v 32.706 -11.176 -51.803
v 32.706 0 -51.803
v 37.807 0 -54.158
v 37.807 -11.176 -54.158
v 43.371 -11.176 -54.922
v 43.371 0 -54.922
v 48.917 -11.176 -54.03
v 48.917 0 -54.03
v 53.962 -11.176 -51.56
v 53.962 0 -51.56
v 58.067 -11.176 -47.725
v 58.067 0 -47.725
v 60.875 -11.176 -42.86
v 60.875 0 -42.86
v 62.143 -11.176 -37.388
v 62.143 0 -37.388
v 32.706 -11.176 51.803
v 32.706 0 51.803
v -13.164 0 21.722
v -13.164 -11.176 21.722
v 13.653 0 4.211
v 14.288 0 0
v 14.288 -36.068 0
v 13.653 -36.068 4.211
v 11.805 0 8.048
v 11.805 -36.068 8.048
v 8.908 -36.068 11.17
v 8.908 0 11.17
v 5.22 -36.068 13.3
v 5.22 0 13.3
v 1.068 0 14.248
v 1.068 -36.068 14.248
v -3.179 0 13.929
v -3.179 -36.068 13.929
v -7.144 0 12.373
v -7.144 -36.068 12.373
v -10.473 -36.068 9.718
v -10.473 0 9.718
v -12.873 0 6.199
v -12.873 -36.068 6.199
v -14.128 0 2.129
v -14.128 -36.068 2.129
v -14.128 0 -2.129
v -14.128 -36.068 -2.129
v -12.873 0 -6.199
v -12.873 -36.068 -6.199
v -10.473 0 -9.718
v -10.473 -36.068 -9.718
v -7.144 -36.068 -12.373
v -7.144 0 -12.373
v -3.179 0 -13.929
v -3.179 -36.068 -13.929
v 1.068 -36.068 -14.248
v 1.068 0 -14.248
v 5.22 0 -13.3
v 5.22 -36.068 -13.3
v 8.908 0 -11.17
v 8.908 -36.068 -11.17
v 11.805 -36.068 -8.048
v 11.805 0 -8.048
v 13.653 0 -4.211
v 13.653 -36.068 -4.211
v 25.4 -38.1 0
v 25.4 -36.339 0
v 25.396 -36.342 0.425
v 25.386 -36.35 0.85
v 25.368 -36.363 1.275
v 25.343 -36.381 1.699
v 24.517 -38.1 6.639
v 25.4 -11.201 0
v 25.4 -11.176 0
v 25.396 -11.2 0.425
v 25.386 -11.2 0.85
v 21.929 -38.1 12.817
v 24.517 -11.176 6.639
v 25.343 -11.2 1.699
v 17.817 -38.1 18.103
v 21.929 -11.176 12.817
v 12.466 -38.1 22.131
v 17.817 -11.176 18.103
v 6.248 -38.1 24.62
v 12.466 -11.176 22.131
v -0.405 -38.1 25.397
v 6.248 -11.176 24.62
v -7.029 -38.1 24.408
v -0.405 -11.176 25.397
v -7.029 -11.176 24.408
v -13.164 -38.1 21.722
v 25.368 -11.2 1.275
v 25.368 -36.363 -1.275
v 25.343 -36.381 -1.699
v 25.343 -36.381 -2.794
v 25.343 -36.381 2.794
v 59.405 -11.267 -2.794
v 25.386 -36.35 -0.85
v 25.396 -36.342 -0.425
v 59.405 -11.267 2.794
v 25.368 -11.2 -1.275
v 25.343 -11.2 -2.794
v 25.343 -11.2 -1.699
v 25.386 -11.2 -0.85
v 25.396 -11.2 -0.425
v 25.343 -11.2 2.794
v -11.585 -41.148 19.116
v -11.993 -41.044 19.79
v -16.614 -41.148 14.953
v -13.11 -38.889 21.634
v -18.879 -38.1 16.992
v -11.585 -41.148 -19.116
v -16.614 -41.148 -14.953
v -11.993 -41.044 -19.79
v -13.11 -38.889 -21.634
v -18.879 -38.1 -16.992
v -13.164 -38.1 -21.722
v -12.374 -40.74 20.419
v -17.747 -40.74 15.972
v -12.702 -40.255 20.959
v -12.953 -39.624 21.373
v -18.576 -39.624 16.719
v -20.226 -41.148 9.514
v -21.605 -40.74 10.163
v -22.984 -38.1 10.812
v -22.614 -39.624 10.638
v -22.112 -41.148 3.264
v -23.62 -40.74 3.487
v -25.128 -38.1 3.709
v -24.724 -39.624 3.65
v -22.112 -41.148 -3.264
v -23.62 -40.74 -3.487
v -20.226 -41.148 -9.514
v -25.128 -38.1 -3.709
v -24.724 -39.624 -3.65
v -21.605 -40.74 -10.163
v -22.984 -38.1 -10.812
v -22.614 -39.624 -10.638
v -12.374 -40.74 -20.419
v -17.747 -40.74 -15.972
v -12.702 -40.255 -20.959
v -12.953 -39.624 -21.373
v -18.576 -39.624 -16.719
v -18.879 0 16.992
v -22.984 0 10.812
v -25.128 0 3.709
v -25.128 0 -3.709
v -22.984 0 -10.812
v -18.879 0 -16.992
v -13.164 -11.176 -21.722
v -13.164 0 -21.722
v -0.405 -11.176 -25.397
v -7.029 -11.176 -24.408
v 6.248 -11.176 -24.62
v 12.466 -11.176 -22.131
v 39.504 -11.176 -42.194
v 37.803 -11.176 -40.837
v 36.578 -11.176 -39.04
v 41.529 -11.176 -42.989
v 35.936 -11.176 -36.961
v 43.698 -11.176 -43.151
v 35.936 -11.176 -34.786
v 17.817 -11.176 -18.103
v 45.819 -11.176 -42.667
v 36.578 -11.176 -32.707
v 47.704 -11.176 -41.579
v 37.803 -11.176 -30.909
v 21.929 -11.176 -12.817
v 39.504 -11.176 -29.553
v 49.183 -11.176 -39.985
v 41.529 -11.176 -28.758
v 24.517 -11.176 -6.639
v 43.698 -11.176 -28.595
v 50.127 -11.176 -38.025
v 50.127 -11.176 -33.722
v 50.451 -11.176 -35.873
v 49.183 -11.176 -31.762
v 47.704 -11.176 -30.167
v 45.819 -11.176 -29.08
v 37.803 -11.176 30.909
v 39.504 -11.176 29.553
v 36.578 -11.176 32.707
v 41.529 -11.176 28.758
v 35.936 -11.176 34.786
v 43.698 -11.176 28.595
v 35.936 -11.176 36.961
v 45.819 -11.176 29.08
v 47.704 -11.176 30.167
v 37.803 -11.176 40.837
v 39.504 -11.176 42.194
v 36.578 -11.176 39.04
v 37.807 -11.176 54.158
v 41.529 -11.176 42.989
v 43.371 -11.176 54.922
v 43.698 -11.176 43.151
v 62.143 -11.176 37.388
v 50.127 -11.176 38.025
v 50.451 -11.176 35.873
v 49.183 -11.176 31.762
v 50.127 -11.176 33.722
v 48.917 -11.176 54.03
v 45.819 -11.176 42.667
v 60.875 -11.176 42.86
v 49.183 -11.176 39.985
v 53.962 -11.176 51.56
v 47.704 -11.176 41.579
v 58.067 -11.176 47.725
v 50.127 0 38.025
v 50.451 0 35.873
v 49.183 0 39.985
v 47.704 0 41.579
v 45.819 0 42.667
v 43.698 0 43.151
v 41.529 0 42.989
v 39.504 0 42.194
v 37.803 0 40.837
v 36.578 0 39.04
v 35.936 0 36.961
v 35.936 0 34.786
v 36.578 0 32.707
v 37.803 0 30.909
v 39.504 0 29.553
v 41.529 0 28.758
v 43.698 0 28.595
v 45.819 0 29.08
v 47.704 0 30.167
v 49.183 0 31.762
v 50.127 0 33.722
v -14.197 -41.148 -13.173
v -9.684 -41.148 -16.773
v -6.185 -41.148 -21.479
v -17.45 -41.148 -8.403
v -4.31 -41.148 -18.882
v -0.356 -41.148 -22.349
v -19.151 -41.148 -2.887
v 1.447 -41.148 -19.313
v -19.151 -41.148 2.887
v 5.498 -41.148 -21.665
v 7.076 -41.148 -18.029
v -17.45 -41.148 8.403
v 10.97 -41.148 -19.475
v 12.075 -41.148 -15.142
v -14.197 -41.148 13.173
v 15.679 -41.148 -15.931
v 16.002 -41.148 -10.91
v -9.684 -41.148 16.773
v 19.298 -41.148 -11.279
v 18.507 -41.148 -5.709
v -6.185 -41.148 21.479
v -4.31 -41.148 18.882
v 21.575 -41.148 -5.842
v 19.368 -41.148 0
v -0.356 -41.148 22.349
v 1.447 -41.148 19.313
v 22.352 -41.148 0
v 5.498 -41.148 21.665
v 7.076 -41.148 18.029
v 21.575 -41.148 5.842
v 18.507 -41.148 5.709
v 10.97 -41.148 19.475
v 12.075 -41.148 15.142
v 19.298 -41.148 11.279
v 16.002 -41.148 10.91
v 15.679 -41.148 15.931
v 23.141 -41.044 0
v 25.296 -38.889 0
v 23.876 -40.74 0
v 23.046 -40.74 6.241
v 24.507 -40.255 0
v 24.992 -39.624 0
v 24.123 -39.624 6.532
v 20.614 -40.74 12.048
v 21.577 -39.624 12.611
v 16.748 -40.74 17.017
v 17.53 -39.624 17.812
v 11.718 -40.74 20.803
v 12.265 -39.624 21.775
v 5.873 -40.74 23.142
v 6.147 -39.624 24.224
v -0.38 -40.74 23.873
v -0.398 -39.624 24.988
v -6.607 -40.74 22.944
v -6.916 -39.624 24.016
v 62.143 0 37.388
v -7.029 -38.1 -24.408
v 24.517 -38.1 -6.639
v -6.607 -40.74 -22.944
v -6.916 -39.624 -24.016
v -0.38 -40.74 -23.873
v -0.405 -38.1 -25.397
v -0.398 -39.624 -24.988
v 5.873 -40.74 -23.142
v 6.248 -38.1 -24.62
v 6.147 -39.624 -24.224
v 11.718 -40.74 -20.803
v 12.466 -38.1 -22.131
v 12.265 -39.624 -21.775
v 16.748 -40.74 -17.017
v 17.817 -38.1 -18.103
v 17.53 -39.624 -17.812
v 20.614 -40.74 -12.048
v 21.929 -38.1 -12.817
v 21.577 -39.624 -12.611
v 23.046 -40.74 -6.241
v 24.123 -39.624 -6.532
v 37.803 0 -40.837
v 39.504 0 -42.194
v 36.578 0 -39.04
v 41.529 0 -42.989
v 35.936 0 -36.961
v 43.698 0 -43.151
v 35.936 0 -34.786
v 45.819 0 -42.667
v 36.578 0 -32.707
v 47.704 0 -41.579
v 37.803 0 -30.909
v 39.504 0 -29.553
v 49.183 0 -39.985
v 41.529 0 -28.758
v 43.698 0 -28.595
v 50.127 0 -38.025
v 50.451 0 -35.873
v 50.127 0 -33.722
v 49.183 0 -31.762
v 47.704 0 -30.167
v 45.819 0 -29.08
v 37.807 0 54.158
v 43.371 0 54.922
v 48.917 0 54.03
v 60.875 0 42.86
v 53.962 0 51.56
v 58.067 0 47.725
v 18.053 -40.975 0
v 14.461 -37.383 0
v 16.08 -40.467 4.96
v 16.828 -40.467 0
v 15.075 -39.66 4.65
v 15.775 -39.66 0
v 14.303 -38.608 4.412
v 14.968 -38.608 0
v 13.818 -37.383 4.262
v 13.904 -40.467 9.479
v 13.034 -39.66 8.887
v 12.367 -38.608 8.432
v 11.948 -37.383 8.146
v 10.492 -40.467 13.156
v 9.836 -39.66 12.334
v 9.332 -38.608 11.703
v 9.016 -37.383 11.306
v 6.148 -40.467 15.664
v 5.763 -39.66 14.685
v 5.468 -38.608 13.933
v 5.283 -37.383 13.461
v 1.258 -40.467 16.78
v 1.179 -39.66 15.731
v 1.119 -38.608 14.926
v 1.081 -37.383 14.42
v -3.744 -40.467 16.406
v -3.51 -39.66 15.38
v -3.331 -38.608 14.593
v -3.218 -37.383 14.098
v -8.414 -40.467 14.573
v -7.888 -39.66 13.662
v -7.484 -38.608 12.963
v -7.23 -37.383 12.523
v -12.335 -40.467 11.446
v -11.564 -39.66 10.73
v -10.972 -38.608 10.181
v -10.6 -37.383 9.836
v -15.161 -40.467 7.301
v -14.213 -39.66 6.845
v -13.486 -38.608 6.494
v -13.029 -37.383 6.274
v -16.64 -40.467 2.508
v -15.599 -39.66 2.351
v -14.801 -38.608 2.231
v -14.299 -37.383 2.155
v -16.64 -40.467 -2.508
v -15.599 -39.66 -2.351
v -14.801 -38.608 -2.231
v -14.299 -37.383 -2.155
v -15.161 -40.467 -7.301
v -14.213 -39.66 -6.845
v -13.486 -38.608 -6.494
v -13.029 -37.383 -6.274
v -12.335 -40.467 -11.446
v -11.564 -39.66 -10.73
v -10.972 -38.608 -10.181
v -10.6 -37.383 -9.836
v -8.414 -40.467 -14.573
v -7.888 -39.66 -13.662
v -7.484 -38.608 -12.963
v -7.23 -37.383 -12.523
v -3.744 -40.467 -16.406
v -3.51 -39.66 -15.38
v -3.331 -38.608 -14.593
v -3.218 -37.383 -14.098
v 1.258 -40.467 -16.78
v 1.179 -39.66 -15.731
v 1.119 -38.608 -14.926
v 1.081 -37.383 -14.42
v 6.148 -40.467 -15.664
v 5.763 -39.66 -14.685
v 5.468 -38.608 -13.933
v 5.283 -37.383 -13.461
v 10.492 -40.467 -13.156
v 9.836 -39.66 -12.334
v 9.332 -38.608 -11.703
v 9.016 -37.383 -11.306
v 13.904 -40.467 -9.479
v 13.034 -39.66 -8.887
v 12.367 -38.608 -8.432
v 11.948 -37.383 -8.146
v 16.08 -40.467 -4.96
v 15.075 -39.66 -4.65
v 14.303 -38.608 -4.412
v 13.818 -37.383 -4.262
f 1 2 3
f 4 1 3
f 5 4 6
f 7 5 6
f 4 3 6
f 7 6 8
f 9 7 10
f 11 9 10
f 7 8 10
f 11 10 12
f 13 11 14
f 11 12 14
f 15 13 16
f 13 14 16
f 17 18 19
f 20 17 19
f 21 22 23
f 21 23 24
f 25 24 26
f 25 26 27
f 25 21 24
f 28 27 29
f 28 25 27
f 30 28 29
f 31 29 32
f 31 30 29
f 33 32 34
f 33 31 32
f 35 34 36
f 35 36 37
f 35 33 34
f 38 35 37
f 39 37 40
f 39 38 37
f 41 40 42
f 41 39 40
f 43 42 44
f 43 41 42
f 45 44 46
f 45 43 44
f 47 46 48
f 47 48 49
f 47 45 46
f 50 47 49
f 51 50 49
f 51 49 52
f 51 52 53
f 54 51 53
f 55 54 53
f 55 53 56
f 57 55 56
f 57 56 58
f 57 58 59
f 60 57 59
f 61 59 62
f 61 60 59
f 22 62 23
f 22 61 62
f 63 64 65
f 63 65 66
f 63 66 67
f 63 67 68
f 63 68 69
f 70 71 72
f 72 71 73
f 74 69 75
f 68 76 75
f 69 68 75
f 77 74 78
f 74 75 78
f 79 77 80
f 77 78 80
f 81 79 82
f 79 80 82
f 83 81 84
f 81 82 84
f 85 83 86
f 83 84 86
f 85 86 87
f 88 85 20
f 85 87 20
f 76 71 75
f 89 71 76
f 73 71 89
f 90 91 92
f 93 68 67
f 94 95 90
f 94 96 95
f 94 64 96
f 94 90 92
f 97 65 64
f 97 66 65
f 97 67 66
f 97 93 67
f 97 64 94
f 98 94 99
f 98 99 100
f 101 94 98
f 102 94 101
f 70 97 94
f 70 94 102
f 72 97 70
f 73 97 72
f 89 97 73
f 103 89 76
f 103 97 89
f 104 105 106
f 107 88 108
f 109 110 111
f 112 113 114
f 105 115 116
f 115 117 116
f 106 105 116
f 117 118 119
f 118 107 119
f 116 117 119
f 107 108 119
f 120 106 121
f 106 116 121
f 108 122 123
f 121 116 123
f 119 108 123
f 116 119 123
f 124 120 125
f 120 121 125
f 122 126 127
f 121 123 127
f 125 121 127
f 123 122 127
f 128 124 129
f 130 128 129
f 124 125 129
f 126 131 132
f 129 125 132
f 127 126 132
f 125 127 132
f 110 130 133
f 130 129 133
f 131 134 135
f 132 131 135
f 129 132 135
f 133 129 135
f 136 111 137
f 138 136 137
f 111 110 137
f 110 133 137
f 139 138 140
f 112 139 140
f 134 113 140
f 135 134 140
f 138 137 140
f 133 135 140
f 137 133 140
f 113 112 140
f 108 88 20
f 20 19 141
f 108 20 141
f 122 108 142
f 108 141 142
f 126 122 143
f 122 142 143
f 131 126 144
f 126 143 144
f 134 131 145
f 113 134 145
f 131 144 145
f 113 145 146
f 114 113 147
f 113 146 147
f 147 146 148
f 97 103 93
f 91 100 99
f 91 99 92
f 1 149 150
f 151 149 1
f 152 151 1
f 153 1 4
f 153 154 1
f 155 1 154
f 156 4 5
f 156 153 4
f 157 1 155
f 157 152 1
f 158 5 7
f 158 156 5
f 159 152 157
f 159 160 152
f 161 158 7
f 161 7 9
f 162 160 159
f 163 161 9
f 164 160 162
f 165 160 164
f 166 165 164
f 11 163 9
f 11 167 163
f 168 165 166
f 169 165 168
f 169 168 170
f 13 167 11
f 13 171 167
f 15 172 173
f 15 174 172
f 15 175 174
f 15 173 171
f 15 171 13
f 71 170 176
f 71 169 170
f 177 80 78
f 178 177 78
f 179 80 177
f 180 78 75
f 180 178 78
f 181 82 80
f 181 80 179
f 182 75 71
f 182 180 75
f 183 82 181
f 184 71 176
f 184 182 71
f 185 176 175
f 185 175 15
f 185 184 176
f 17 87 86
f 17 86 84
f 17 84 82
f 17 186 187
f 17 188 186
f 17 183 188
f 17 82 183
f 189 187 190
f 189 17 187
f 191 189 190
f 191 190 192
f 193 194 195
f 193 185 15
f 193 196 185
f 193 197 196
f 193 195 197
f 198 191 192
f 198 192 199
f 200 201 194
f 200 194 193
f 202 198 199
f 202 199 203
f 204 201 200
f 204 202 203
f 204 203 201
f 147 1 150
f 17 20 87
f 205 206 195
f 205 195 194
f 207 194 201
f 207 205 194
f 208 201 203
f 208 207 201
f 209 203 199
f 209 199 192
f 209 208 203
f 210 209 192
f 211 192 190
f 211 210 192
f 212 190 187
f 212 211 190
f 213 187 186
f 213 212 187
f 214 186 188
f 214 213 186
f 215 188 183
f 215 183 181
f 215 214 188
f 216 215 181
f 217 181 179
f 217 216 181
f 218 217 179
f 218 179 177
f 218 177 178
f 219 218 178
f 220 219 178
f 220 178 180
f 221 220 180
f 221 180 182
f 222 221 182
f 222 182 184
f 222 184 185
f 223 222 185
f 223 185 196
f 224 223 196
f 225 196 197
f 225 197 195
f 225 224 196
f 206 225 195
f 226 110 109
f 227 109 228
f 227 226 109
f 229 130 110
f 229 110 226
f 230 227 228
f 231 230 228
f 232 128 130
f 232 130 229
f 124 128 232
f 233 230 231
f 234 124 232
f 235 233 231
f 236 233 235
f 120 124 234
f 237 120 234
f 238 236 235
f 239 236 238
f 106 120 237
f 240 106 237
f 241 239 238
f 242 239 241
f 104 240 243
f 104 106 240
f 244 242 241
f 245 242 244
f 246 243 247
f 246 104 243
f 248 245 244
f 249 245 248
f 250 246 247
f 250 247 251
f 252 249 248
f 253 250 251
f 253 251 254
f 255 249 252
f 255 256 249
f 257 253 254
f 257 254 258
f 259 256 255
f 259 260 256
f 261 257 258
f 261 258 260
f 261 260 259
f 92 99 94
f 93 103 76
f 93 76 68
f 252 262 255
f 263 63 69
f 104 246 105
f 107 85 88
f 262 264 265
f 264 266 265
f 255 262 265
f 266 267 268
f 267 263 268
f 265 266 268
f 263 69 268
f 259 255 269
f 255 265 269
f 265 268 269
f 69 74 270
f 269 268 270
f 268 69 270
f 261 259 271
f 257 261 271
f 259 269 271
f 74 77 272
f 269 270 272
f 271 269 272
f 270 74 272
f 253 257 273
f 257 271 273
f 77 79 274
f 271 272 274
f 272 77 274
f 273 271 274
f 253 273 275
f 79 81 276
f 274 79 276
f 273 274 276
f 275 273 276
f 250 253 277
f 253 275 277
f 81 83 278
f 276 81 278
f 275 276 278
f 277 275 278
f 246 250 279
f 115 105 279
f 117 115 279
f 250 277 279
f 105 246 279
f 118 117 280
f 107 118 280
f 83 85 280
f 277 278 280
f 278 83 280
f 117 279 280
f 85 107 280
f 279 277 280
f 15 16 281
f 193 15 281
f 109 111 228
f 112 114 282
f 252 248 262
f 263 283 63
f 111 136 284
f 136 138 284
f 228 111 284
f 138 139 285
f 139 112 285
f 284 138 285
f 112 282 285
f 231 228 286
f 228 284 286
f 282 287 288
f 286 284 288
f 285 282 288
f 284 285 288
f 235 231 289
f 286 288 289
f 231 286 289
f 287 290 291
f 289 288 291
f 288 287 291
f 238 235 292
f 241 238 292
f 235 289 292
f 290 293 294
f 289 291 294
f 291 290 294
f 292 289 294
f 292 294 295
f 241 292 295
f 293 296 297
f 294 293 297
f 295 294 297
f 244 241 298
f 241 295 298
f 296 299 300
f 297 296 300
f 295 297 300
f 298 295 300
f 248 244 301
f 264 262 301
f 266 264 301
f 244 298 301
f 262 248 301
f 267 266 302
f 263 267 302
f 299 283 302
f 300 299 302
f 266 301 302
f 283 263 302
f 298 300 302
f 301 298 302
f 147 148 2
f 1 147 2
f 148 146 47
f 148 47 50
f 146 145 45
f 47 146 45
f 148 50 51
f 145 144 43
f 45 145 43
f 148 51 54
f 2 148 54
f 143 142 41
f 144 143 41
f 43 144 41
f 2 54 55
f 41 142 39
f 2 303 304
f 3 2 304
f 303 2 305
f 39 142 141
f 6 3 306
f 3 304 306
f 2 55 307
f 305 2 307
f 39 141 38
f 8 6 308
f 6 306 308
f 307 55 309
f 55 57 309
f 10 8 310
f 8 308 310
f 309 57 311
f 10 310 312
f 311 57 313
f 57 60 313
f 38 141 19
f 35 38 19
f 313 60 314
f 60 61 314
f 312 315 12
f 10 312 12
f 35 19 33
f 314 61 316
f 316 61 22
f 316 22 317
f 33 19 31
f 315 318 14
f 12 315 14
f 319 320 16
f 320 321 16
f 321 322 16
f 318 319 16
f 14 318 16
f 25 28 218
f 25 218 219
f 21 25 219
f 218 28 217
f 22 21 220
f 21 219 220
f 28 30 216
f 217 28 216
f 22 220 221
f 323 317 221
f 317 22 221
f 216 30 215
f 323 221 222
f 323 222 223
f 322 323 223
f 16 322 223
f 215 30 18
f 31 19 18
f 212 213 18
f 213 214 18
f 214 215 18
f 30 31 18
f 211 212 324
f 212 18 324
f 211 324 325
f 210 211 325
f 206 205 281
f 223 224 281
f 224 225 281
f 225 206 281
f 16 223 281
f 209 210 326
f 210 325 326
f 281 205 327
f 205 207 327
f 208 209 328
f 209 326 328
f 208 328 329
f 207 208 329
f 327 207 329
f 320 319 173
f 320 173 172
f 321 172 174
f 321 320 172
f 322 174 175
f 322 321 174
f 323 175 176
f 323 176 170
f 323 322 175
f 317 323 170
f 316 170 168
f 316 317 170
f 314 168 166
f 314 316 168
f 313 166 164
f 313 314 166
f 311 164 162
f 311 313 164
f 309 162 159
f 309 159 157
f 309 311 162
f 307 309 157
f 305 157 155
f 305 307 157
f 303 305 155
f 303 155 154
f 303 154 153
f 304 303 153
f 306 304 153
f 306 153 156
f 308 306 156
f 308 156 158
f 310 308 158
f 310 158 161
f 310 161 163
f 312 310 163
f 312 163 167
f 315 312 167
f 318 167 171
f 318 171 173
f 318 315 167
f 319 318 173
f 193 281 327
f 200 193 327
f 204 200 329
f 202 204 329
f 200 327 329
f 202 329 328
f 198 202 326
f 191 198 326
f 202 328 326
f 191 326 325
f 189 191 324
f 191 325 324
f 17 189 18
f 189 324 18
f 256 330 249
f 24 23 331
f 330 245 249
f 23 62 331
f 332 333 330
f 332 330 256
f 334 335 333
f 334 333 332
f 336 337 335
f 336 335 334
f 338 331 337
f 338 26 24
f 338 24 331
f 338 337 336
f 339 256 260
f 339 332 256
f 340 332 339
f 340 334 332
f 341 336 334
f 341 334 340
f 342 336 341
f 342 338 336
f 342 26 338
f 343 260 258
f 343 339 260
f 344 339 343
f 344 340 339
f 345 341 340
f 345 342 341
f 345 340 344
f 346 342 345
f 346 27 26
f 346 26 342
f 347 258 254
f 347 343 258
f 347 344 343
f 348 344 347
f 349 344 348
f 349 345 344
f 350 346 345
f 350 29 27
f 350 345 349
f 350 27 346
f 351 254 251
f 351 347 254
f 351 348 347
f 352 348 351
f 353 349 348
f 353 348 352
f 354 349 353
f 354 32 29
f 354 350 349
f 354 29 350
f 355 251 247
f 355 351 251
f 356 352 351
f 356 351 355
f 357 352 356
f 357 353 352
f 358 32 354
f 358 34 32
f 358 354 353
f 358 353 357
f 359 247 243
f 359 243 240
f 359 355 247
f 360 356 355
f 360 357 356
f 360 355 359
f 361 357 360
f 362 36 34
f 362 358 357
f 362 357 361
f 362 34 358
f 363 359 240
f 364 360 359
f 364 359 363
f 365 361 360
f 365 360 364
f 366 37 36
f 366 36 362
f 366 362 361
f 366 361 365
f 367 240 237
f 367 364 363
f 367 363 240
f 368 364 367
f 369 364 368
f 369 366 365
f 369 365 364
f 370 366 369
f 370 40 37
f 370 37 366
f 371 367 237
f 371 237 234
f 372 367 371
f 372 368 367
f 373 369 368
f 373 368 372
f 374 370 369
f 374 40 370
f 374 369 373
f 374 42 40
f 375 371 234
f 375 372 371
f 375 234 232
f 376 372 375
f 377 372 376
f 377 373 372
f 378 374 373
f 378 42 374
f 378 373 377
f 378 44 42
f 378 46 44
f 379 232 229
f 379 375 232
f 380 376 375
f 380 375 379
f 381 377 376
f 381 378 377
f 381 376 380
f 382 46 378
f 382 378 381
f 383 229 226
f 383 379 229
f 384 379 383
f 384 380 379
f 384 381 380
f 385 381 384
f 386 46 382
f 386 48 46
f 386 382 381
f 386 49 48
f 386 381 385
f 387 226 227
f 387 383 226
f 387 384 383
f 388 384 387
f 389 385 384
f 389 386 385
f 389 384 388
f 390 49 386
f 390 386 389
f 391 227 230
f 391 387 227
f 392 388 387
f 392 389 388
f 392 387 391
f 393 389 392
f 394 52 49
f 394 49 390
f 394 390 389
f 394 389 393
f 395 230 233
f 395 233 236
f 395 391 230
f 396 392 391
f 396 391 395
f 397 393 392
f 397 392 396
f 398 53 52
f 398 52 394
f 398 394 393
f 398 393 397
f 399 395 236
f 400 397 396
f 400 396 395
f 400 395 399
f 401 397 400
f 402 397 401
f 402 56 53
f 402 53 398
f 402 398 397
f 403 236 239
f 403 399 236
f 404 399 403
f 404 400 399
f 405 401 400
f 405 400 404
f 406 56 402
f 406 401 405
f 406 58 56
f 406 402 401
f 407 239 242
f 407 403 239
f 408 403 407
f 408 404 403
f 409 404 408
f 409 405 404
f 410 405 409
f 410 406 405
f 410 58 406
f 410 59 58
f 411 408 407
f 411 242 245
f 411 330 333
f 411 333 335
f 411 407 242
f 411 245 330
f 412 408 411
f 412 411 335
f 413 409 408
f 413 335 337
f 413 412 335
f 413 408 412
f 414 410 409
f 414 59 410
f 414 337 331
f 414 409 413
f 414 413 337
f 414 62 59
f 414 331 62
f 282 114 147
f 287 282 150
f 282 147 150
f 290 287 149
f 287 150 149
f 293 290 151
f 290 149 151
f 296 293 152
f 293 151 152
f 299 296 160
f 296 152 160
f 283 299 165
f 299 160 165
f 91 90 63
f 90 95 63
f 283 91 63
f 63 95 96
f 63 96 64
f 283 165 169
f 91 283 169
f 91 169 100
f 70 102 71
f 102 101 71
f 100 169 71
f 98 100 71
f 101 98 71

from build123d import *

# Parameters (mm, degrees)
F0_R     = 14.2875
F1_DEPTH = 41.148
F0_R_2   = 7.298311
F2_DEPTH = 11.176
F3_R     = 5.08
F4_R     = 3.048
F6_DEPTH = 2.794


with BuildPart() as f1:
    # F0 (on Front) → F1 (new body)
    with BuildSketch(Plane.XZ):
        with BuildLine():
            ThreePointArc((-13.16432, -21.722355), (12.465678, -22.130677), (25.4, 0))
            ThreePointArc((25.4, 0), (12.465678, 22.130677), (-13.16432, 21.722355))
            ThreePointArc((-13.16432, 21.722355), (-25.4, 0), (-13.16432, -21.722355))
        make_face()
        Circle(F0_R, mode=Mode.SUBTRACT)
    extrude(amount=F1_DEPTH)

    # F0 (on Front) → F2 (join)
    with BuildSketch(Plane.XZ):
        with BuildLine():
            ThreePointArc((-13.16432, 21.722355), (12.465678, 22.130677), (25.4, 0))
            ThreePointArc((25.4, 0), (12.465678, -22.130677), (-13.16432, -21.722355))
            Line((-13.16432, -21.722355), (32.706421, -51.803458))
            ThreePointArc((32.706421, -51.803458), (51.531426, -52.981963), (62.14277, -37.388084))
            Line((62.14277, -37.388084), (62.14277, 37.388084))
            ThreePointArc((62.14277, 37.388084), (51.531426, 52.981963), (32.706421, 51.803458))
            Line((32.706421, 51.803458), (-13.16432, 21.722355))
        make_face()
        with Locations((43.15309, -35.873311)):
            Circle(F0_R_2, mode=Mode.SUBTRACT)
        with Locations((43.15309, 35.873311)):
            Circle(F0_R_2, mode=Mode.SUBTRACT)
    extrude(amount=F2_DEPTH)

    # F3
    f3_edges = [f1.edges().sort_by_distance(p)[0] for p in [
        (-14.2875, -41.148, 0),
    ]]
    fillet(f3_edges, radius=F3_R)

    # F4
    f4_edges = [f1.edges().sort_by_distance(p)[0] for p in [
        (-25.4, -41.148, 0),
    ]]
    fillet(f4_edges, radius=F4_R)

    # F5 (on Top) → F6 (join, symmetric)
    with BuildSketch(Plane.XY):
        Polygon((59.404932, -11.267408), (25.343085, -11.20039), (25.343085, -36.381185), align=None)
    extrude(amount=F6_DEPTH, both=True)


solid = f1.part
